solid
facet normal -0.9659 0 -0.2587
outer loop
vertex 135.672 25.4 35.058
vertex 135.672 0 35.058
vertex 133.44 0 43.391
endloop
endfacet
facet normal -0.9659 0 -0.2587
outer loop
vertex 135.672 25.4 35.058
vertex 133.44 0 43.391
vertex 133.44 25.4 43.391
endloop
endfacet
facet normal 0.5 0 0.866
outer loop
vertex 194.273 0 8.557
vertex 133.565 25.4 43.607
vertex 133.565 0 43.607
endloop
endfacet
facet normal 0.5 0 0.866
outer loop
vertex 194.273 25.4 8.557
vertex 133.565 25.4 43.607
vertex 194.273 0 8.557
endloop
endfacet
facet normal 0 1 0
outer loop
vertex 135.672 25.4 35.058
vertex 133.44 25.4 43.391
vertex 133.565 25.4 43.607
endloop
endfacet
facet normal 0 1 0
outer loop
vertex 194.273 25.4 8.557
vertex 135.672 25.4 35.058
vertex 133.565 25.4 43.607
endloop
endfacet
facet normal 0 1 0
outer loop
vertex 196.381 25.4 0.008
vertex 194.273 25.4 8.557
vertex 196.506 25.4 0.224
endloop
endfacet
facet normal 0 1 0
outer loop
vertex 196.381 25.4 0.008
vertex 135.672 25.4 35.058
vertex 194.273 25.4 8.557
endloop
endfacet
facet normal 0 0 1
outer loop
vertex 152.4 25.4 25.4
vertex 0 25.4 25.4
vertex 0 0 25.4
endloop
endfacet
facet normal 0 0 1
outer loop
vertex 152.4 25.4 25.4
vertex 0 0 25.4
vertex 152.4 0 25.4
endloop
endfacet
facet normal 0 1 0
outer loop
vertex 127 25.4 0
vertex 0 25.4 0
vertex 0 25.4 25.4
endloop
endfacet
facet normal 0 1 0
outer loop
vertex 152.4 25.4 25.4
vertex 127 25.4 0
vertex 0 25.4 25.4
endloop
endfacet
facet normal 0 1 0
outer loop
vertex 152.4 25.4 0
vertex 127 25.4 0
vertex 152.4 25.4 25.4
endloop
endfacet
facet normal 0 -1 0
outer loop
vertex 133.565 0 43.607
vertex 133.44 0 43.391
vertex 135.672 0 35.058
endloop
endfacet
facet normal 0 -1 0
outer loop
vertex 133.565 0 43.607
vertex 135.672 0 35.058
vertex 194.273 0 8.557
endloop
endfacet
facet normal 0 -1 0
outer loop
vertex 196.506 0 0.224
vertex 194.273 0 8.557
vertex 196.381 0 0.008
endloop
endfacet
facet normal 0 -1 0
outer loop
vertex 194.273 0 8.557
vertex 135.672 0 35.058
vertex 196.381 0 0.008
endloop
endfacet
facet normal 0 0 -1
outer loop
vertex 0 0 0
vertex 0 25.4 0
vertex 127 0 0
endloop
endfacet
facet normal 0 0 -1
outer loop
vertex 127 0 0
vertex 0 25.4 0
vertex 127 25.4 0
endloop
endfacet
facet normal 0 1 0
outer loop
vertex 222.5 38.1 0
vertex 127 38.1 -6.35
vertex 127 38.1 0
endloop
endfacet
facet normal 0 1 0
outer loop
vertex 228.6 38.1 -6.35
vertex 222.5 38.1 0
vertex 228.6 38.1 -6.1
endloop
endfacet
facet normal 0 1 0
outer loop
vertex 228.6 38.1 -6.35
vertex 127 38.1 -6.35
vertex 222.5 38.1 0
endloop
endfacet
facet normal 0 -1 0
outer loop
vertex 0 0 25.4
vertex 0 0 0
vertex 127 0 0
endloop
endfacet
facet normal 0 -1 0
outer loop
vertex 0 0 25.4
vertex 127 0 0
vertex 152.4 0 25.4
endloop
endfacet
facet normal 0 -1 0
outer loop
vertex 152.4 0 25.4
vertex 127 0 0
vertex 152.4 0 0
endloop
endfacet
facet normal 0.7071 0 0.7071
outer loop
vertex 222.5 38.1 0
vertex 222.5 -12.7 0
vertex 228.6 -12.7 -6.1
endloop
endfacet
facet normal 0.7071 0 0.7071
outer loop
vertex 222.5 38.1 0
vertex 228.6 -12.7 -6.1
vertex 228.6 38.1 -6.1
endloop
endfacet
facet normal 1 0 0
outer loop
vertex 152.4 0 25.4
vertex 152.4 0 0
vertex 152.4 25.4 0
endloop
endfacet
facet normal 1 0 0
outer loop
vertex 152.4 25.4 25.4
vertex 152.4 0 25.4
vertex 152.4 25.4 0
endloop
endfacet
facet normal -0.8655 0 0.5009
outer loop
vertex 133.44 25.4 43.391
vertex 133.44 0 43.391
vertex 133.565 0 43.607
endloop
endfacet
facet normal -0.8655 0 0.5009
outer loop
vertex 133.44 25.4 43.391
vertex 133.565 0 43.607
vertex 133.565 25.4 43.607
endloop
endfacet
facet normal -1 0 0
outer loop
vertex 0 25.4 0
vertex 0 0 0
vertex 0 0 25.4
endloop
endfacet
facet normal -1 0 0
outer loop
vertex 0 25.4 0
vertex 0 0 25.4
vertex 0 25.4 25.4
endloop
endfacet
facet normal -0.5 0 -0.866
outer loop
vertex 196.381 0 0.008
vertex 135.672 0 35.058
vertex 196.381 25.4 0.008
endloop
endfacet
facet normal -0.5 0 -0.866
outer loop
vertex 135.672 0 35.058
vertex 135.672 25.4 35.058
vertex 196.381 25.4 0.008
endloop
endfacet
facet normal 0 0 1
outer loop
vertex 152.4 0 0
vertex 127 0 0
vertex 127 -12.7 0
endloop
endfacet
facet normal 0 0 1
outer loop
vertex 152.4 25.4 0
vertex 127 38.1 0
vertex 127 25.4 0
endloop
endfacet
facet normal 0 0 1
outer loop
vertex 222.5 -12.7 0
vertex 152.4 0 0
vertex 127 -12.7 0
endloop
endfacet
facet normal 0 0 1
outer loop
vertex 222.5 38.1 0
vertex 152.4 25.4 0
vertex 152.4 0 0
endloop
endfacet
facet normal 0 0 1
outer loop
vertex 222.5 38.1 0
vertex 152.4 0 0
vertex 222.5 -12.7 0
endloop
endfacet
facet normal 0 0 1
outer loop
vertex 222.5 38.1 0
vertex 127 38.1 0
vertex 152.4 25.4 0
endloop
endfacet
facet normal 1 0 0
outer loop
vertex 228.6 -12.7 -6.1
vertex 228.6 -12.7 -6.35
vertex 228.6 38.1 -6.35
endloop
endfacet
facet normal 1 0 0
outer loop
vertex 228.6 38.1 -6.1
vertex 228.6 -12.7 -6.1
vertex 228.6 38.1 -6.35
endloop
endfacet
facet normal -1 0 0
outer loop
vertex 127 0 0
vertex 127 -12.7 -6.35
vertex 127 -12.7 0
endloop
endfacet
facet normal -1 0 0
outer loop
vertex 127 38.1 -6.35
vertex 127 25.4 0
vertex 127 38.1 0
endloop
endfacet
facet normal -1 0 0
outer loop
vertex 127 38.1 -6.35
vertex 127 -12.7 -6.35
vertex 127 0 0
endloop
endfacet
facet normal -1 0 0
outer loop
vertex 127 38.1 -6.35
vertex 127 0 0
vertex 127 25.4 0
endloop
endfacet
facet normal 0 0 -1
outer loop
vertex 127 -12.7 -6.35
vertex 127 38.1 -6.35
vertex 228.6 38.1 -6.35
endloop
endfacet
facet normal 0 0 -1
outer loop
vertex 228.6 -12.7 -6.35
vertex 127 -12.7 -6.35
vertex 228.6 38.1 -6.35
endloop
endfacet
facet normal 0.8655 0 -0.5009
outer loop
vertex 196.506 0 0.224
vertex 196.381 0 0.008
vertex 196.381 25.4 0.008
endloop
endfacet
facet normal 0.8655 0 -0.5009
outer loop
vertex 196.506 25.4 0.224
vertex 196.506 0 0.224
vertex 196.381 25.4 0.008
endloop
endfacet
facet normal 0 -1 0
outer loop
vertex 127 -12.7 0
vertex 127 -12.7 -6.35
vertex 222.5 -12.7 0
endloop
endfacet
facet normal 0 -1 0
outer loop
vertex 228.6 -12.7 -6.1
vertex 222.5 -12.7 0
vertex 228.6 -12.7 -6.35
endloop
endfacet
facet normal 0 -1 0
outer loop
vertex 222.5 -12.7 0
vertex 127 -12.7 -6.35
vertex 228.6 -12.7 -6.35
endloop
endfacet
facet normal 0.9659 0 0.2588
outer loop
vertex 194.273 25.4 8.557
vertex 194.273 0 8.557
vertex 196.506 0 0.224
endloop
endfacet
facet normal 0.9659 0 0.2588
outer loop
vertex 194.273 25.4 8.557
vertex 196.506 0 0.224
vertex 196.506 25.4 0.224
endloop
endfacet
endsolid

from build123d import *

# Parameters (mm, degrees)
BOX002_W               = 76.2
BOX002_H               = 25.4
BOX002_DEPTH           = 6.35
BOX002_PLACEMENT_ANGLE = 30
CHAMFER001_SIZE        = 6.1
BOX001_W               = 101.6
BOX001_H               = 50.8
BOX001_DEPTH           = 6.35
CHAMFER_SIZE           = 6.1
BOX_W                  = 152.4
BOX_H                  = 25.4
BOX_DEPTH              = 25.4


with BuildPart() as breaker_bar:
    # Box002 → Box002 (new body)
    with BuildSketch(Plane.XY):
        with Locations((38.1, 12.7)):
            Rectangle(BOX002_W, BOX002_H)
    extrude(amount=BOX002_DEPTH)


with BuildPart() as breaker_bar_1:
    # Box002 placement: moved
    add(breaker_bar.part.moved(Location((130.389586, -0.875268, 38.10798))).rotate(Axis((130.389586, -0.875268, 38.10798), (0, 1, 0)), BOX002_PLACEMENT_ANGLE))

    # Chamfer001
    chamfer001_edges = [breaker_bar_1.edges().sort_by_distance(p)[0] for p in [
        (130.389586, 11.824732, 38.10798),
        (199.555722, 11.824732, 5.507241),
    ]]
    chamfer(chamfer001_edges, length=CHAMFER001_SIZE)


with BuildPart() as breaker_bar_2:
    # Chamfer001 placement: moved
    add(breaker_bar_1.part.moved(Location((0, 0.875268, 0))))


with BuildPart() as knife:
    # Box001 → Box001 (new body)
    with BuildSketch(Plane(origin=(127, -12.7, -6.35), x_dir=(1, 0, 0), z_dir=(0, 0, 1))):
        with Locations((50.8, 25.4)):
            Rectangle(BOX001_W, BOX001_H)
    extrude(amount=BOX001_DEPTH)

    # Chamfer
    chamfer_edges = [knife.edges().sort_by_distance(p)[0] for p in [
        (228.6, 12.7, 0),
    ]]
    chamfer(chamfer_edges, length=CHAMFER_SIZE)


with BuildPart() as tooth_bar:
    # Box → Box (new body)
    with BuildSketch(Plane.XY):
        with Locations((76.2, 12.7)):
            Rectangle(BOX_W, BOX_H)
    extrude(amount=BOX_DEPTH)

    # Fusion: union Breaker bar, Knife
    add(breaker_bar_2.part)
    add(knife.part)


solid = tooth_bar.part
